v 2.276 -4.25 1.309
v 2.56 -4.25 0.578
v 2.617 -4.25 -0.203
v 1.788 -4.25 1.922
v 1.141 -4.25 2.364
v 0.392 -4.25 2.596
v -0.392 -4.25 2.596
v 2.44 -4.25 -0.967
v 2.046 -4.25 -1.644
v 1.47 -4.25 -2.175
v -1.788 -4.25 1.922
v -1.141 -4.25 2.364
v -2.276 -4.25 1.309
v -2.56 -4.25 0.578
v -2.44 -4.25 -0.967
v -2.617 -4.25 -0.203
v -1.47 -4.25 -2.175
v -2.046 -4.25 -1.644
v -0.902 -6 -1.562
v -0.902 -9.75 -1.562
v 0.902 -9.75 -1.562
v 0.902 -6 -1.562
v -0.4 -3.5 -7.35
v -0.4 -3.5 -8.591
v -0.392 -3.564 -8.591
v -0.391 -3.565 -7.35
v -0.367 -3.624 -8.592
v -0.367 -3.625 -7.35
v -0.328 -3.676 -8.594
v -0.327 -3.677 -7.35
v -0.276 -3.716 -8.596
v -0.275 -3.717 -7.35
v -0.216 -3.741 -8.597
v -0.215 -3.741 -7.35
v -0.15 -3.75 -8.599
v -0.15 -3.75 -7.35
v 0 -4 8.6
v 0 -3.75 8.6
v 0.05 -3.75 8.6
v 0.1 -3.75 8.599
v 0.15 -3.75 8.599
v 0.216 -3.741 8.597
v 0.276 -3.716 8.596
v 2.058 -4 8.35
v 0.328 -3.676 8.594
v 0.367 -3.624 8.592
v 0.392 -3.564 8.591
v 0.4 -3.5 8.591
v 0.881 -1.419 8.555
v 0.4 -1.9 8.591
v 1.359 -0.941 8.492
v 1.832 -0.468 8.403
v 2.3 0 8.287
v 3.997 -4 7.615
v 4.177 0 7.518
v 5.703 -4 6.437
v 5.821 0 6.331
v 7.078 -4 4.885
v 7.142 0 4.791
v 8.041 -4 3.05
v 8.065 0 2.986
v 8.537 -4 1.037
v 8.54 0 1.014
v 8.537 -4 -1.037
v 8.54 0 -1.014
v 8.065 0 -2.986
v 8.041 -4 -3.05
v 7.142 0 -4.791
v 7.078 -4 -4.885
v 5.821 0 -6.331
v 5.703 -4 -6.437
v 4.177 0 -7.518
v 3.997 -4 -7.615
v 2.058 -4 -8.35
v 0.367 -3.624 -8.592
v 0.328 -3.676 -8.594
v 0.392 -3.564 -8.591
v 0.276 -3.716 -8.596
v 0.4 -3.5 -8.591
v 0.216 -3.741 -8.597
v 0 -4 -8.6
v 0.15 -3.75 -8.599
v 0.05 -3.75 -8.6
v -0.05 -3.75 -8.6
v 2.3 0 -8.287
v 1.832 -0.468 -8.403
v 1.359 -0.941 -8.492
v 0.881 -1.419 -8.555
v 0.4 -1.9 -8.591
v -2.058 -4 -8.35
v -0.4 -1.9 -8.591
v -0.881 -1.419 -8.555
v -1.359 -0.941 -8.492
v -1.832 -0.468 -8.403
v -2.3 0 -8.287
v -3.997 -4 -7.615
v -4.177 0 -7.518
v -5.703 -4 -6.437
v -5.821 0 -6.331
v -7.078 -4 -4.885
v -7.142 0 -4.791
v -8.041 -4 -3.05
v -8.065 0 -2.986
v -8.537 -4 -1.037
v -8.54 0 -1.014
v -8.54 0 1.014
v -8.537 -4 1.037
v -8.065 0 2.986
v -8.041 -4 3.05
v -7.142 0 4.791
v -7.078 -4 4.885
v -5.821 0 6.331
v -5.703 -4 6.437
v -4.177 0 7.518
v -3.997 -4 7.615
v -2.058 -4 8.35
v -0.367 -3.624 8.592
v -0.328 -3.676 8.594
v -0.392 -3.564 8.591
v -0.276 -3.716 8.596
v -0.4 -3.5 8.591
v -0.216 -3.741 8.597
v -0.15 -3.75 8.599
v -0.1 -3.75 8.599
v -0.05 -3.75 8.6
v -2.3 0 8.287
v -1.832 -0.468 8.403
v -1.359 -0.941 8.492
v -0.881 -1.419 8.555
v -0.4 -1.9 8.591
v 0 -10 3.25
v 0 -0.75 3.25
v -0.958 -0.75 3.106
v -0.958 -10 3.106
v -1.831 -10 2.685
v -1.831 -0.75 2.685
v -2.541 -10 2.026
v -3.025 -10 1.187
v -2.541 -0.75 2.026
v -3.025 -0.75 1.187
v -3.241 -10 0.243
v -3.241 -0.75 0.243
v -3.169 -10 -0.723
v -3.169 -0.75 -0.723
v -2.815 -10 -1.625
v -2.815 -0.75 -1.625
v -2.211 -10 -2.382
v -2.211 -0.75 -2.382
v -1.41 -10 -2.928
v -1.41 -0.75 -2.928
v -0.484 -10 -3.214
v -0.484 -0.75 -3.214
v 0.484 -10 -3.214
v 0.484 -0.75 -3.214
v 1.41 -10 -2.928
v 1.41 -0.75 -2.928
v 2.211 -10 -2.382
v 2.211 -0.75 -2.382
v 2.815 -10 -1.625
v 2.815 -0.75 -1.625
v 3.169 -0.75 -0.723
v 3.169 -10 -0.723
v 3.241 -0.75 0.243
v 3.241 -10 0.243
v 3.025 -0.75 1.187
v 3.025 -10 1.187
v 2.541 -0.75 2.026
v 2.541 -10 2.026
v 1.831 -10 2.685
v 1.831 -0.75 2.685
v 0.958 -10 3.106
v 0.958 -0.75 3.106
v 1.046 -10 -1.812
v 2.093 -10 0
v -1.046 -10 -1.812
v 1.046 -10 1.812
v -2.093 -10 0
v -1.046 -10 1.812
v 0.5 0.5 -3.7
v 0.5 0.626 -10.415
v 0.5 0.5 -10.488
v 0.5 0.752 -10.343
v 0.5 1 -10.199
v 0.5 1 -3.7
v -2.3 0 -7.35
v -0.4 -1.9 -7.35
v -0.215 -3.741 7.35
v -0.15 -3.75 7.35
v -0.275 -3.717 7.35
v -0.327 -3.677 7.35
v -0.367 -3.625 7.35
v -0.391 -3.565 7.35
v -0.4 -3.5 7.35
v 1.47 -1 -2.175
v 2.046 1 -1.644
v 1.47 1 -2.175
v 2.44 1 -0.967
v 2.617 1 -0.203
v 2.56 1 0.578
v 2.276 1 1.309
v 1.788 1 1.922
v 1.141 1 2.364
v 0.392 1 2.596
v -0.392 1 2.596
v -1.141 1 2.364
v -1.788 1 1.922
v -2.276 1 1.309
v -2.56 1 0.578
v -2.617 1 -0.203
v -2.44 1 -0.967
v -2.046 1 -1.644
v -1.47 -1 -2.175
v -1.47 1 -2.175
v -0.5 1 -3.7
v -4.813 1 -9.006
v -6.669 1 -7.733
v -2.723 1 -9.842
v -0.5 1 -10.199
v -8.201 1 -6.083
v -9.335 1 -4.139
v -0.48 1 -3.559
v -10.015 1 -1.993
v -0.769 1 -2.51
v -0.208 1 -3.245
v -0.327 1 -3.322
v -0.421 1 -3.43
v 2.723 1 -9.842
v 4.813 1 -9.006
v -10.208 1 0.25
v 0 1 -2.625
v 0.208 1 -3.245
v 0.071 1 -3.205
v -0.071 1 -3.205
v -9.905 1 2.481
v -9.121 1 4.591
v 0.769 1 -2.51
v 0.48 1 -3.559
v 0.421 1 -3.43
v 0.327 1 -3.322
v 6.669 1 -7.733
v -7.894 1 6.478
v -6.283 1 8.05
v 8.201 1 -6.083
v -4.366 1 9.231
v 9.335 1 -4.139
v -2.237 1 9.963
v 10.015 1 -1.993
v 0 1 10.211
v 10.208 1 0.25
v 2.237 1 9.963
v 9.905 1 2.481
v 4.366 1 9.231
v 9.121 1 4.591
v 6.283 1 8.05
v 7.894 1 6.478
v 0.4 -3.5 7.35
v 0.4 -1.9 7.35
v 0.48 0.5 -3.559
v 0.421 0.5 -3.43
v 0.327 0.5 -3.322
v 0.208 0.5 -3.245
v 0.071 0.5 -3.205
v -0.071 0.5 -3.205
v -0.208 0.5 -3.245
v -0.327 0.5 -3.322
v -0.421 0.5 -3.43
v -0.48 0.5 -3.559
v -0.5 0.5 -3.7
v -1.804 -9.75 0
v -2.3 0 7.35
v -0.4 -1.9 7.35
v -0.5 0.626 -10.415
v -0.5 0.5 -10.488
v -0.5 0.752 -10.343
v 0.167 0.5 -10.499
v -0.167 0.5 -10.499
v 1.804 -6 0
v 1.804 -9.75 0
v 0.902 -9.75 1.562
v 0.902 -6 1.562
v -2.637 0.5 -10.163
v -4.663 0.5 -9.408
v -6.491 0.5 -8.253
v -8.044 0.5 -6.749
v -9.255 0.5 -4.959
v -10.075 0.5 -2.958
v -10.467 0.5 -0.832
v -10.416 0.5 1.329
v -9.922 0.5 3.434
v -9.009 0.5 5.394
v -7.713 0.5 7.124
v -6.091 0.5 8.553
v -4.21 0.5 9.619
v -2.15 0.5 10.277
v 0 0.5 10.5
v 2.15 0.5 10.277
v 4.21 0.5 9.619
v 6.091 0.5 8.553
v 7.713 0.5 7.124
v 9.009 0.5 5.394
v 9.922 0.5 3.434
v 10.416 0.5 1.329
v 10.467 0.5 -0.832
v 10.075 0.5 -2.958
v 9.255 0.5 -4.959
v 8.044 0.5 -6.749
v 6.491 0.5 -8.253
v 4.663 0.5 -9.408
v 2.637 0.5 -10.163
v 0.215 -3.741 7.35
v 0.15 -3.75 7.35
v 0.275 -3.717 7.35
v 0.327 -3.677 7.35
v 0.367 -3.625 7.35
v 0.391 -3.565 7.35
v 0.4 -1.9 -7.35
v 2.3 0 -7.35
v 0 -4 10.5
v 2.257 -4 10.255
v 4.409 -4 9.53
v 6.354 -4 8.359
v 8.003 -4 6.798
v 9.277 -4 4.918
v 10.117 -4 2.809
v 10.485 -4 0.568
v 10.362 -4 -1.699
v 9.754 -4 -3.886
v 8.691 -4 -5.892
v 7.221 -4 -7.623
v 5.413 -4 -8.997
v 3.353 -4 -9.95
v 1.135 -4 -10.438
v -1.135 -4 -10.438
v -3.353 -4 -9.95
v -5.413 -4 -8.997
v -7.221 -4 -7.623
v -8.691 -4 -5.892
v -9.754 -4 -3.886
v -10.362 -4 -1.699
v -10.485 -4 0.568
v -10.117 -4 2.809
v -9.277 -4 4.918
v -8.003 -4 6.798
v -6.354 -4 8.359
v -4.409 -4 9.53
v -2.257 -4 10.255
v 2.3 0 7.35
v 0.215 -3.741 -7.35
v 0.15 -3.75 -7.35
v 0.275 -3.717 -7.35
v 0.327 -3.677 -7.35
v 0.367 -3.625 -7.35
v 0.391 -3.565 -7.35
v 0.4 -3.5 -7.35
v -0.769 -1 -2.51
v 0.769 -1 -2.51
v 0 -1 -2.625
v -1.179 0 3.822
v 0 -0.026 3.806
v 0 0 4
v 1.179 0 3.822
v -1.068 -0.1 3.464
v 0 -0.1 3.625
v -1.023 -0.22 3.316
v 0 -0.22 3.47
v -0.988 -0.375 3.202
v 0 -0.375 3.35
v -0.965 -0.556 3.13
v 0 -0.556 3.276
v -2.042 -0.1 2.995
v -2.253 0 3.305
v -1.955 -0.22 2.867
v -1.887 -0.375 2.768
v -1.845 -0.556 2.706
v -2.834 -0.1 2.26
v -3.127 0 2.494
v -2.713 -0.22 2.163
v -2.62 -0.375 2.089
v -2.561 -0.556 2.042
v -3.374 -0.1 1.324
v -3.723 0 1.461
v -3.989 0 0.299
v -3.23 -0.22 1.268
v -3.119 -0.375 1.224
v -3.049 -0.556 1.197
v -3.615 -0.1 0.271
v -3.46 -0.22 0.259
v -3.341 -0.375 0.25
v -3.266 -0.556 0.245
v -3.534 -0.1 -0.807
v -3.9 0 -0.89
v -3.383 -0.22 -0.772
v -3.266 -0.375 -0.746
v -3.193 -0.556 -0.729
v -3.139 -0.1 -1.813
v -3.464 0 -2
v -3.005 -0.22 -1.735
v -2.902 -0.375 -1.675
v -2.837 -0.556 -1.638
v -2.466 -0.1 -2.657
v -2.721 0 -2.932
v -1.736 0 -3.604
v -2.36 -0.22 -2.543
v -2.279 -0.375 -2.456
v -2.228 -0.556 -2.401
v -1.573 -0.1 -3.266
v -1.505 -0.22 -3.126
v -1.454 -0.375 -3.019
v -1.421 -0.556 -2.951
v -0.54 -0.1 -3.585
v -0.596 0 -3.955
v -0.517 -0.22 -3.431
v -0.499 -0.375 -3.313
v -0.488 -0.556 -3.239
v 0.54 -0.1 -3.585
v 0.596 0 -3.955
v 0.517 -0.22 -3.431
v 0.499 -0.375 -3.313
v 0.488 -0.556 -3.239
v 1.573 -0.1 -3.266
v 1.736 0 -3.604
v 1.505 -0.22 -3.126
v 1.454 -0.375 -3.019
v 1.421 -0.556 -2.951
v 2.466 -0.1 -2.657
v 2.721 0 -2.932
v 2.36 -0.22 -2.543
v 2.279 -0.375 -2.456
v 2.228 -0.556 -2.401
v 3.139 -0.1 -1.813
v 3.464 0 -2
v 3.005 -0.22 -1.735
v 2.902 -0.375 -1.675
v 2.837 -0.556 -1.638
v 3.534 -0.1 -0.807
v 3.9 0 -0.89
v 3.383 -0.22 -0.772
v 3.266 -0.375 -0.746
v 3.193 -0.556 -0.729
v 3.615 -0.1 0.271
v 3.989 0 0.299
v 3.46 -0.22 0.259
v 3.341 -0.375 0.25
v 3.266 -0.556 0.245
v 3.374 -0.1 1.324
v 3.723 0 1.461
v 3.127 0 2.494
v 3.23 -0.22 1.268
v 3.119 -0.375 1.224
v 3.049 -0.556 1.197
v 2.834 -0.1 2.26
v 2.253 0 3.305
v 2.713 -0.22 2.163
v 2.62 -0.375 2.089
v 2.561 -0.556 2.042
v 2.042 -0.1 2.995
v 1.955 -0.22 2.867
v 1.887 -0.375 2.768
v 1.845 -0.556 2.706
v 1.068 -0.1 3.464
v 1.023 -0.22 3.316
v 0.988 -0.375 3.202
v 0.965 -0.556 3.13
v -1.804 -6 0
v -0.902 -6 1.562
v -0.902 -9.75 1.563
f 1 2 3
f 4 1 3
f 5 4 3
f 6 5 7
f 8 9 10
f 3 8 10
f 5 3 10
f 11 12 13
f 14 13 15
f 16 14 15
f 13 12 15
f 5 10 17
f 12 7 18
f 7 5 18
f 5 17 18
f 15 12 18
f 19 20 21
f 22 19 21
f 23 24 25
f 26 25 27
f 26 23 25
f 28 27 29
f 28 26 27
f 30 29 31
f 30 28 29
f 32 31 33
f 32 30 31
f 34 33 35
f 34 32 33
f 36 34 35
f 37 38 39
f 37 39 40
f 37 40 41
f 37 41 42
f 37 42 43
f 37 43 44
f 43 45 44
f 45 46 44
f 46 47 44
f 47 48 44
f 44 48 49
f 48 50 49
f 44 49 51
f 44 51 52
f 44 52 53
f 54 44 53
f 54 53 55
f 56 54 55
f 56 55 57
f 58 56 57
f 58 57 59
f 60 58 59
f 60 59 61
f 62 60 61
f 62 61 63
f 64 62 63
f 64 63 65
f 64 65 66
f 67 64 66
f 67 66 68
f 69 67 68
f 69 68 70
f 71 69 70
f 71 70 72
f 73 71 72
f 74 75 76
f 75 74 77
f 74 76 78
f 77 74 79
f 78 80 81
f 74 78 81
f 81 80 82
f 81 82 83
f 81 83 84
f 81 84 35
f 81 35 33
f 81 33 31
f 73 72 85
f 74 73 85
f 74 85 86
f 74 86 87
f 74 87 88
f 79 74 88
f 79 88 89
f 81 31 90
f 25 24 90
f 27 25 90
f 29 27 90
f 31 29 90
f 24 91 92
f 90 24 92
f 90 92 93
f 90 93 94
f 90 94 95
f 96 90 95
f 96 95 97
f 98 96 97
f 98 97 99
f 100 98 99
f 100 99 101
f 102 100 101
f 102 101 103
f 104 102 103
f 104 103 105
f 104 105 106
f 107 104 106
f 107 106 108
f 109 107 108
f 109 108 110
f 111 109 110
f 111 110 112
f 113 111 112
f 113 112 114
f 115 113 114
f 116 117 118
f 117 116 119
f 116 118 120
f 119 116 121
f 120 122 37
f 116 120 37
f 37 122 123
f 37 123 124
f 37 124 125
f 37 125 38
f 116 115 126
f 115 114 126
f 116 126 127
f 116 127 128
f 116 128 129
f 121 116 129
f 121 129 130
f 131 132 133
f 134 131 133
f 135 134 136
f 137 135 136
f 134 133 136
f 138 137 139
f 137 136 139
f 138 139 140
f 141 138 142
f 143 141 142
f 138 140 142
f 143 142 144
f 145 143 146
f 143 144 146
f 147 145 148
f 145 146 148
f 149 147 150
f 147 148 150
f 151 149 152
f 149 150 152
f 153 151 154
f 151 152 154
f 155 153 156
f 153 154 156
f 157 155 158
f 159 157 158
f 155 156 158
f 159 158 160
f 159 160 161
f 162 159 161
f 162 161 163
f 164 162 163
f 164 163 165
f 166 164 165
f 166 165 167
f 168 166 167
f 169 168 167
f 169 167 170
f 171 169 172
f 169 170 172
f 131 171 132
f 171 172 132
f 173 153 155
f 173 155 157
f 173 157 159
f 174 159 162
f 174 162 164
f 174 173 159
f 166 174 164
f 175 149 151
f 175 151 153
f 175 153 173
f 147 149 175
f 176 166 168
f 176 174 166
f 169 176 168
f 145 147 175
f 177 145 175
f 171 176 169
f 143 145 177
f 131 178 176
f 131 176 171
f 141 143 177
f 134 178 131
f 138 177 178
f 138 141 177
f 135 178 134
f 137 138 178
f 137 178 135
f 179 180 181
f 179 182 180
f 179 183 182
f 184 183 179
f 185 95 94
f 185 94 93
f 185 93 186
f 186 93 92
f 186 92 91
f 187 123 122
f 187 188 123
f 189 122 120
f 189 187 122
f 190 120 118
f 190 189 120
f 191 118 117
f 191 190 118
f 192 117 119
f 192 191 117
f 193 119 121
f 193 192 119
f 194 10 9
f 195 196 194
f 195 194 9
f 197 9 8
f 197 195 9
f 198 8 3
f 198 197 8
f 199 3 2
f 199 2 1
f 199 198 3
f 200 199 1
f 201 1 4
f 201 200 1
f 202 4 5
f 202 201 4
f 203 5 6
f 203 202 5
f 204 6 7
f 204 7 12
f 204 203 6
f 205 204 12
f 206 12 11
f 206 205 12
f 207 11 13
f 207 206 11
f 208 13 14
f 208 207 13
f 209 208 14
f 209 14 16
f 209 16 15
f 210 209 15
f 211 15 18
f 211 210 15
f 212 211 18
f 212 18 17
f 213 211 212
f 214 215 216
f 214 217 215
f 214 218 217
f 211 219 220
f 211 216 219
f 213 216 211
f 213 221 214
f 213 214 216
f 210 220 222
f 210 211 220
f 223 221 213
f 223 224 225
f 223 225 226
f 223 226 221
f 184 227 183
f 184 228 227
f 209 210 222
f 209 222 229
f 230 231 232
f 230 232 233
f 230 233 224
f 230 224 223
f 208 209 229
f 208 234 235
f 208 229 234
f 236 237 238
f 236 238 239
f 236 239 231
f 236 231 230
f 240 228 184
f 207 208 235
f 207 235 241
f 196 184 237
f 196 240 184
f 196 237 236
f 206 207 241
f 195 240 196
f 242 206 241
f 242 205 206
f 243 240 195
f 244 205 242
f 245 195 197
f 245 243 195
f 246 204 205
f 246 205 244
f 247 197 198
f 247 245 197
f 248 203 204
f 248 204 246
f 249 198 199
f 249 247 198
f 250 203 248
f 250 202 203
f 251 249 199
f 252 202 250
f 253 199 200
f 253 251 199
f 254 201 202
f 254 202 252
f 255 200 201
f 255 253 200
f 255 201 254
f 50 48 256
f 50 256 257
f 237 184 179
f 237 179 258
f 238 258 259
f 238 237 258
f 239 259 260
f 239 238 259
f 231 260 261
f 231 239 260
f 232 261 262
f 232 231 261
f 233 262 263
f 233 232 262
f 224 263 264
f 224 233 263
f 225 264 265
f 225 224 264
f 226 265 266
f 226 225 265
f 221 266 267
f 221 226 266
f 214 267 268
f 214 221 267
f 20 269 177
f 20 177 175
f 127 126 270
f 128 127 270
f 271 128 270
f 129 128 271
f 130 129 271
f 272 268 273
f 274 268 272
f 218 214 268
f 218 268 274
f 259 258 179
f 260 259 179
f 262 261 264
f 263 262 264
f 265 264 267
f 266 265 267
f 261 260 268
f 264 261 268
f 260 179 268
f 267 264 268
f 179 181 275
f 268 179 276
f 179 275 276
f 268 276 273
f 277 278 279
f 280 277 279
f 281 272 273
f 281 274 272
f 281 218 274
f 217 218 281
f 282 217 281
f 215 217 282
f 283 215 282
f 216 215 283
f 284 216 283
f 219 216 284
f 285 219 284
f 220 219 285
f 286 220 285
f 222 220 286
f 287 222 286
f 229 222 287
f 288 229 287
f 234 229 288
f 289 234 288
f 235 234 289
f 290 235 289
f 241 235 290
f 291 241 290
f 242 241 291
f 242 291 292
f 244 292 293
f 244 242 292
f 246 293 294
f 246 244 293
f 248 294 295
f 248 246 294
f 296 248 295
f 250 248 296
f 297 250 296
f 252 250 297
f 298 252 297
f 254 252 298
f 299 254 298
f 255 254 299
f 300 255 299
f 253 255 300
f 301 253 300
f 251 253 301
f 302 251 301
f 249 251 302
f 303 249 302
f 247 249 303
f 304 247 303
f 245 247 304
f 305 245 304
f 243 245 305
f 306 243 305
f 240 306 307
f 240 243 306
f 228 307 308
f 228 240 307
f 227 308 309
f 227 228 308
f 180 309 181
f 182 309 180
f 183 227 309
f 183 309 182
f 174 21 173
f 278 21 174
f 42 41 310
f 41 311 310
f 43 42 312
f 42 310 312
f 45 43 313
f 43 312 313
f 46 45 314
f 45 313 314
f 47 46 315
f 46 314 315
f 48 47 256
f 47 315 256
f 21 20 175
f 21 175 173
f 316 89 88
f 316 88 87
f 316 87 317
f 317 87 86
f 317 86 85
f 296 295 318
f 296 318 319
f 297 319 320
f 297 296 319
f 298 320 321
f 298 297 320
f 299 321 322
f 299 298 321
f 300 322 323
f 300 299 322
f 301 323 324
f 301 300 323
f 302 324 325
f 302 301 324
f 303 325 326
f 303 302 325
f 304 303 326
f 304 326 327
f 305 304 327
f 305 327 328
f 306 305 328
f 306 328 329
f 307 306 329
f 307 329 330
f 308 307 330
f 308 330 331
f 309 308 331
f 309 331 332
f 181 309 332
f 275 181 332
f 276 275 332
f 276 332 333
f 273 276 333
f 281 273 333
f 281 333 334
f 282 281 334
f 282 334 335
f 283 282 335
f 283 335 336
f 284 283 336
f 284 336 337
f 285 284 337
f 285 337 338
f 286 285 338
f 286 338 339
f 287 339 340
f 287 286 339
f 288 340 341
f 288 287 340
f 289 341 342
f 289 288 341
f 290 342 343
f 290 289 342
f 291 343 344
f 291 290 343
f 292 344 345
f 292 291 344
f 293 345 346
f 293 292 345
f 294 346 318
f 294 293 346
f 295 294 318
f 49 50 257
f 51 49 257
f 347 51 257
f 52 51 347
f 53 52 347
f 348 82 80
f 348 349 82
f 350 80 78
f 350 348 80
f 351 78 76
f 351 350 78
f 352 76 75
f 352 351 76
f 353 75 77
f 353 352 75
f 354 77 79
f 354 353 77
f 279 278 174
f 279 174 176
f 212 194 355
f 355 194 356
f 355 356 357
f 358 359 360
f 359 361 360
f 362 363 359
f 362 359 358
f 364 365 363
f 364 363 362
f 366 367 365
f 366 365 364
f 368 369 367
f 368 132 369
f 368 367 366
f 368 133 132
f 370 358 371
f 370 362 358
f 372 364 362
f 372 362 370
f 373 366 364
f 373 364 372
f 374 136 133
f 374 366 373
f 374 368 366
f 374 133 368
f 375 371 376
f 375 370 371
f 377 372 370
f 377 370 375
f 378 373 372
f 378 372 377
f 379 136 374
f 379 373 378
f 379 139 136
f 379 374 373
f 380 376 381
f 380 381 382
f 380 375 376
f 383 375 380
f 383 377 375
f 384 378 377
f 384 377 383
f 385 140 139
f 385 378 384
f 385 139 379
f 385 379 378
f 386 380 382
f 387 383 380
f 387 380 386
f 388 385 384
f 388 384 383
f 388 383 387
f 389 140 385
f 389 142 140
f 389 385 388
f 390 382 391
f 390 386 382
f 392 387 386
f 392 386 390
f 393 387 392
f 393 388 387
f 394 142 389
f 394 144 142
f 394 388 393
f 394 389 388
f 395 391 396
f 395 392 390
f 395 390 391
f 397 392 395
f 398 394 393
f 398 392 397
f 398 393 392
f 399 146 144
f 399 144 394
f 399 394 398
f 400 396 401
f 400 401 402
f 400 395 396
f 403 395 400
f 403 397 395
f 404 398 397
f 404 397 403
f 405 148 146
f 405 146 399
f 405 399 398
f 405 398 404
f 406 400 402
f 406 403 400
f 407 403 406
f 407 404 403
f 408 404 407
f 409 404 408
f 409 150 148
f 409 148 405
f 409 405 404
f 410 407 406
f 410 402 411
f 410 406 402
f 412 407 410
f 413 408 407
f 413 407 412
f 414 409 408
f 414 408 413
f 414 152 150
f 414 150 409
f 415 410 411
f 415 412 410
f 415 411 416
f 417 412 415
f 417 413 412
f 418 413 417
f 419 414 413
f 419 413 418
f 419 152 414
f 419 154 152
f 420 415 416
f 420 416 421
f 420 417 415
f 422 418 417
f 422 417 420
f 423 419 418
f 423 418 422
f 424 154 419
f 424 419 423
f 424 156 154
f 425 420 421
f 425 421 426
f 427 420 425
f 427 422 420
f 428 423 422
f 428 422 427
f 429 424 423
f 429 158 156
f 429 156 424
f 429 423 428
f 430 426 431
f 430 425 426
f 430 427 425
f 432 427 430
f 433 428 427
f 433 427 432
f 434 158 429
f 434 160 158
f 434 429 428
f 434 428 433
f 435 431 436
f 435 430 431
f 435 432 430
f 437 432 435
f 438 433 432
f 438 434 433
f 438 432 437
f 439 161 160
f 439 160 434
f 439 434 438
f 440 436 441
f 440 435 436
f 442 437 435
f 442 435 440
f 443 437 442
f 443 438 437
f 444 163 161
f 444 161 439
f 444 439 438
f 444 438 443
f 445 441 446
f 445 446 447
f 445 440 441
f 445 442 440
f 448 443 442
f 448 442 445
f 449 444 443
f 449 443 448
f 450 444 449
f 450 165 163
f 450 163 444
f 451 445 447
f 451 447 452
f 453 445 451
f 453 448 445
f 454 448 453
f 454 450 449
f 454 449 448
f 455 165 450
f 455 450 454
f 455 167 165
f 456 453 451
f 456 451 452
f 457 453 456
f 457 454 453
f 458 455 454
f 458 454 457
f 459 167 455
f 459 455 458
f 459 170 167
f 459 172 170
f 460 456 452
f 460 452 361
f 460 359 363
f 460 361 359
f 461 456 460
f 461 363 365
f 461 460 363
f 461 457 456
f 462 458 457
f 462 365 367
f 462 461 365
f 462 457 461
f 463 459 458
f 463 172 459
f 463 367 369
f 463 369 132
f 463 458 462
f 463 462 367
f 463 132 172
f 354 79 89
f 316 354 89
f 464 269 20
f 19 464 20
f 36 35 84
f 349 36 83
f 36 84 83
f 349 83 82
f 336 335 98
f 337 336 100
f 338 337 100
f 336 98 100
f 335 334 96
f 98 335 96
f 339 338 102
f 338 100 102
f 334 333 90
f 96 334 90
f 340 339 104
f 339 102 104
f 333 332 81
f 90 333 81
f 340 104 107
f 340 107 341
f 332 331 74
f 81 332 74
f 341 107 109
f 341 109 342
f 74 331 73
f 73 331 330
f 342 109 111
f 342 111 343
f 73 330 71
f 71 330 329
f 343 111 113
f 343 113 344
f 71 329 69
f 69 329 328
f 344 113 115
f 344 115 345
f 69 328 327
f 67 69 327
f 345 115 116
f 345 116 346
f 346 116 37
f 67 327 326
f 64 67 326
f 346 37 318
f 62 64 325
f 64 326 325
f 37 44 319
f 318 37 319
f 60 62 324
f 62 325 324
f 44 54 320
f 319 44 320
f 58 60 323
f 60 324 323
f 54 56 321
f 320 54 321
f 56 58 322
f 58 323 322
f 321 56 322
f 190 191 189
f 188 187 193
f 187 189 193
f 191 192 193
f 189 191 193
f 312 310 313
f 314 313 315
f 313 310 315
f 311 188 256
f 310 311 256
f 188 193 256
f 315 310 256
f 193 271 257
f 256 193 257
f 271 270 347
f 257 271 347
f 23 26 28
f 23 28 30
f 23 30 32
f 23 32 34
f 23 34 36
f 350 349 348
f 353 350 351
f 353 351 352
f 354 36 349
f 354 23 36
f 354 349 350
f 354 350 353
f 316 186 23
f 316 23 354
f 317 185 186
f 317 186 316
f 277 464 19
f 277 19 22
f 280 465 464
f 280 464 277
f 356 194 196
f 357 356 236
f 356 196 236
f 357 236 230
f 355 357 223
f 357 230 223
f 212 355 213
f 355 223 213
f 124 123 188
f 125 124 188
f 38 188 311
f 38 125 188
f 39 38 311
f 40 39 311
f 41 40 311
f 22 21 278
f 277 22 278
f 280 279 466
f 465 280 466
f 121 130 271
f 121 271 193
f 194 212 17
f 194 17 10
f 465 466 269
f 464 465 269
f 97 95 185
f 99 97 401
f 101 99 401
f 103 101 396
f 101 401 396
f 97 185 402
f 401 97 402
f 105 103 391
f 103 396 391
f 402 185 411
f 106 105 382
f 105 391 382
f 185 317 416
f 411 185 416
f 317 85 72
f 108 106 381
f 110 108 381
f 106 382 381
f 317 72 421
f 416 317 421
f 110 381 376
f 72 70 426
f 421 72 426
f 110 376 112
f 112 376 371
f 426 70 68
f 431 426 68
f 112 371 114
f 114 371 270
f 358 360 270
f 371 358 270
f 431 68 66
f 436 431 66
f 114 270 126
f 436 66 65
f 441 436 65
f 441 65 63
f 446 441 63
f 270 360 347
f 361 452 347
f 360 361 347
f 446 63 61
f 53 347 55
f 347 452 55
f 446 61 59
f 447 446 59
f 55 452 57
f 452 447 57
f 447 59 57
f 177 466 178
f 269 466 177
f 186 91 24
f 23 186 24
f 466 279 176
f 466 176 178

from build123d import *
from build123d.topology import SkipClean

# Parameters (mm, degrees)
SKETCH1_R           = 10.5
SKETCH1_R_2         = 8.6
BOSS_EXTRUDE1_DEPTH = 4
BOSS_EXTRUDE2_DEPTH = 1.25
BOSS_EXTRUDE3_START = 17.2
BOSS_EXTRUDE3_DEPTH = 1.25
BOSS_EXTRUDE4_START = 1
SKETCH3_R           = 10.5
BOSS_EXTRUDE4_DEPTH = 1
SKETCH5_R           = 3.25
BOSS_EXTRUDE5_DEPTH = 10
FILLET2_R           = 0.75
CUT_EXTRUDE1_DEPTH  = 5.25
FILLET1_R           = 0.25
SKETCH7_R           = 2.625
CUT_EXTRUDE2_DEPTH  = 2
CUT_EXTRUDE3_DEPTH  = 0.5
CUT_EXTRUDE4_DEPTH  = 4
CHAMFER2_SIZE       = 0.25
CHAMFER3_SIZE       = 0.5
CHAMFER3_SIZE2      = 0.288675135


with BuildPart() as part:
    # Sketch1 → Boss-Extrude1 (new body)
    with BuildSketch(Plane(origin=(0, 0, 0), x_dir=(1, 0, 0), z_dir=(0, 1, 0))):
        with Locations(Location((0, 0, 0), (0, 0, 270))):
            Circle(SKETCH1_R)
        with Locations(Location((0, 0, 0), (0, 0, 270))):
            Circle(SKETCH1_R_2, mode=Mode.SUBTRACT)
    extrude(amount=-BOSS_EXTRUDE1_DEPTH)

    # Sketch2 → Boss-Extrude2 (add)
    with BuildSketch(Plane(origin=(0, 0, 8.6), x_dir=(-1, 0, 0), z_dir=(0, 0, -1))):
        Polygon((0.4, -3.75), (-0.4, -3.75), (-0.4, -1.9), (-2.3, 0), (2.3, 0), (0.4, -1.9), align=None)
    extrude(amount=BOSS_EXTRUDE2_DEPTH)

    # Sketch2<2> → Boss-Extrude3 (add)
    with BuildSketch(Plane(origin=(0, 0, 8.6), x_dir=(-1, 0, 0), z_dir=(0, 0, -1)).offset(BOSS_EXTRUDE3_START)):
        Polygon((0.4, -3.75), (-0.4, -3.75), (-0.4, -1.9), (-2.3, 0), (2.3, 0), (0.4, -1.9), align=None)
    extrude(amount=-BOSS_EXTRUDE3_DEPTH)

    # Sketch3 → Boss-Extrude4 (add)
    with BuildSketch(Plane(origin=(0, 0, 0), x_dir=(1, 0, 0), z_dir=(0, 1, 0)).offset(BOSS_EXTRUDE4_START)):
        with Locations(Location((0, 0, 0), (0, 0, 270))):
            Circle(SKETCH3_R)
    extrude(amount=-BOSS_EXTRUDE4_DEPTH)

    # Sketch5 → Boss-Extrude5 (add)
    with BuildSketch(Plane.XZ):
        with Locations(Location((0, 0, 0), (0, 0, 90))):
            Circle(SKETCH5_R)
    extrude(amount=BOSS_EXTRUDE5_DEPTH)

    # Fillet2
    fillet2_edges = [part.edges().sort_by_distance(p)[0] for p in [
        (0, 0, -3.25),
    ]]
    fillet(fillet2_edges, radius=FILLET2_R)

    # Sketch4 → Cut-Extrude1 (cut)
    with BuildSketch(Plane(origin=(0, 1, 0), x_dir=(1, 0, 0), z_dir=(0, 1, 0))):
        with BuildLine():
            Line((-1.469693846, 2.175), (1.469693846, 2.175))
            ThreePointArc((1.469693846, 2.175), (0, -2.625), (-1.469693846, 2.175))
        make_face()
    extrude(amount=-CUT_EXTRUDE1_DEPTH, mode=Mode.SUBTRACT)

    # Fillet1
    fillet1_edges = [part.edges().sort_by_distance(p)[0] for p in [
        (-0.4, -3.75, 7.970346319),
        (0.4, -3.75, 7.970346319),
        (-0.4, -3.75, -7.970346319),
        (0.4, -3.75, -7.970346319),
    ]]
    fillet(fillet1_edges, radius=FILLET1_R)

    # Sketch7 → Cut-Extrude2 (cut)
    with SkipClean():  # the faces are left unmerged after this step: merging them gives an invalid solid
        with BuildSketch(Plane(origin=(0, 1, 0), x_dir=(1, 0, 0), z_dir=(0, 1, 0))):
            with Locations(Location((0, 0, 0), (0, 0, 270))):
                Circle(SKETCH7_R)
        extrude(amount=-CUT_EXTRUDE2_DEPTH, mode=Mode.SUBTRACT)

    # Sketch9 → Cut-Extrude3 (cut)
    with SkipClean():  # the faces are left unmerged after this step: merging them gives an invalid solid
        with BuildSketch(Plane(origin=(0, 1, 0), x_dir=(1, 0, 0), z_dir=(0, 1, 0))):
            with BuildLine():
                Line((-0.5, 3.7), (-0.5, 13.7))
                ThreePointArc((-0.5, 13.7), (0, 14.2), (0.5, 13.7))
                Line((0.5, 13.7), (0.5, 3.7))
                ThreePointArc((0.5, 3.7), (0, 3.2), (-0.5, 3.7))
            make_face()
        extrude(amount=-CUT_EXTRUDE3_DEPTH, mode=Mode.SUBTRACT)

    # Sketch10 → Cut-Extrude4 (cut)
    with SkipClean():  # the faces are left unmerged after this step: merging them gives an invalid solid
        with BuildSketch(Plane.XZ.offset(10)):
            Polygon((1.804219591, 0), (0.902109796, 1.5625), (-0.902109796, 1.5625), (-1.804219591, 0), (-0.902109796, -1.5625), (0.902109796, -1.5625), align=None)
        extrude(amount=-CUT_EXTRUDE4_DEPTH, mode=Mode.SUBTRACT)

    # Chamfer2
    chamfer2_edges = [part.edges().sort_by_distance(p)[0] for p in [
        (1.353164693, -10, -0.78125),
        (1.353164693, -10, 0.78125),
        (0, -10, 1.5625),
        (-1.353164693, -10, 0.78125),
        (-1.353164693, -10, -0.78125),
        (0, -10, -1.5625),
    ]]
    chamfer(chamfer2_edges, length=CHAMFER2_SIZE)

    # Chamfer3
    chamfer3_edges = [part.edges().sort_by_distance(p)[0] for p in [
        (-10.497021698, 1, 0.250070932),
    ]]
    chamfer3_side = [part.faces().sort_by_distance(p)[0] for p in [
        (0, -1.5, -10.5),
    ]]
    chamfer(chamfer3_edges, length=CHAMFER3_SIZE, length2=CHAMFER3_SIZE2, reference=chamfer3_side[0])


solid = part.part
